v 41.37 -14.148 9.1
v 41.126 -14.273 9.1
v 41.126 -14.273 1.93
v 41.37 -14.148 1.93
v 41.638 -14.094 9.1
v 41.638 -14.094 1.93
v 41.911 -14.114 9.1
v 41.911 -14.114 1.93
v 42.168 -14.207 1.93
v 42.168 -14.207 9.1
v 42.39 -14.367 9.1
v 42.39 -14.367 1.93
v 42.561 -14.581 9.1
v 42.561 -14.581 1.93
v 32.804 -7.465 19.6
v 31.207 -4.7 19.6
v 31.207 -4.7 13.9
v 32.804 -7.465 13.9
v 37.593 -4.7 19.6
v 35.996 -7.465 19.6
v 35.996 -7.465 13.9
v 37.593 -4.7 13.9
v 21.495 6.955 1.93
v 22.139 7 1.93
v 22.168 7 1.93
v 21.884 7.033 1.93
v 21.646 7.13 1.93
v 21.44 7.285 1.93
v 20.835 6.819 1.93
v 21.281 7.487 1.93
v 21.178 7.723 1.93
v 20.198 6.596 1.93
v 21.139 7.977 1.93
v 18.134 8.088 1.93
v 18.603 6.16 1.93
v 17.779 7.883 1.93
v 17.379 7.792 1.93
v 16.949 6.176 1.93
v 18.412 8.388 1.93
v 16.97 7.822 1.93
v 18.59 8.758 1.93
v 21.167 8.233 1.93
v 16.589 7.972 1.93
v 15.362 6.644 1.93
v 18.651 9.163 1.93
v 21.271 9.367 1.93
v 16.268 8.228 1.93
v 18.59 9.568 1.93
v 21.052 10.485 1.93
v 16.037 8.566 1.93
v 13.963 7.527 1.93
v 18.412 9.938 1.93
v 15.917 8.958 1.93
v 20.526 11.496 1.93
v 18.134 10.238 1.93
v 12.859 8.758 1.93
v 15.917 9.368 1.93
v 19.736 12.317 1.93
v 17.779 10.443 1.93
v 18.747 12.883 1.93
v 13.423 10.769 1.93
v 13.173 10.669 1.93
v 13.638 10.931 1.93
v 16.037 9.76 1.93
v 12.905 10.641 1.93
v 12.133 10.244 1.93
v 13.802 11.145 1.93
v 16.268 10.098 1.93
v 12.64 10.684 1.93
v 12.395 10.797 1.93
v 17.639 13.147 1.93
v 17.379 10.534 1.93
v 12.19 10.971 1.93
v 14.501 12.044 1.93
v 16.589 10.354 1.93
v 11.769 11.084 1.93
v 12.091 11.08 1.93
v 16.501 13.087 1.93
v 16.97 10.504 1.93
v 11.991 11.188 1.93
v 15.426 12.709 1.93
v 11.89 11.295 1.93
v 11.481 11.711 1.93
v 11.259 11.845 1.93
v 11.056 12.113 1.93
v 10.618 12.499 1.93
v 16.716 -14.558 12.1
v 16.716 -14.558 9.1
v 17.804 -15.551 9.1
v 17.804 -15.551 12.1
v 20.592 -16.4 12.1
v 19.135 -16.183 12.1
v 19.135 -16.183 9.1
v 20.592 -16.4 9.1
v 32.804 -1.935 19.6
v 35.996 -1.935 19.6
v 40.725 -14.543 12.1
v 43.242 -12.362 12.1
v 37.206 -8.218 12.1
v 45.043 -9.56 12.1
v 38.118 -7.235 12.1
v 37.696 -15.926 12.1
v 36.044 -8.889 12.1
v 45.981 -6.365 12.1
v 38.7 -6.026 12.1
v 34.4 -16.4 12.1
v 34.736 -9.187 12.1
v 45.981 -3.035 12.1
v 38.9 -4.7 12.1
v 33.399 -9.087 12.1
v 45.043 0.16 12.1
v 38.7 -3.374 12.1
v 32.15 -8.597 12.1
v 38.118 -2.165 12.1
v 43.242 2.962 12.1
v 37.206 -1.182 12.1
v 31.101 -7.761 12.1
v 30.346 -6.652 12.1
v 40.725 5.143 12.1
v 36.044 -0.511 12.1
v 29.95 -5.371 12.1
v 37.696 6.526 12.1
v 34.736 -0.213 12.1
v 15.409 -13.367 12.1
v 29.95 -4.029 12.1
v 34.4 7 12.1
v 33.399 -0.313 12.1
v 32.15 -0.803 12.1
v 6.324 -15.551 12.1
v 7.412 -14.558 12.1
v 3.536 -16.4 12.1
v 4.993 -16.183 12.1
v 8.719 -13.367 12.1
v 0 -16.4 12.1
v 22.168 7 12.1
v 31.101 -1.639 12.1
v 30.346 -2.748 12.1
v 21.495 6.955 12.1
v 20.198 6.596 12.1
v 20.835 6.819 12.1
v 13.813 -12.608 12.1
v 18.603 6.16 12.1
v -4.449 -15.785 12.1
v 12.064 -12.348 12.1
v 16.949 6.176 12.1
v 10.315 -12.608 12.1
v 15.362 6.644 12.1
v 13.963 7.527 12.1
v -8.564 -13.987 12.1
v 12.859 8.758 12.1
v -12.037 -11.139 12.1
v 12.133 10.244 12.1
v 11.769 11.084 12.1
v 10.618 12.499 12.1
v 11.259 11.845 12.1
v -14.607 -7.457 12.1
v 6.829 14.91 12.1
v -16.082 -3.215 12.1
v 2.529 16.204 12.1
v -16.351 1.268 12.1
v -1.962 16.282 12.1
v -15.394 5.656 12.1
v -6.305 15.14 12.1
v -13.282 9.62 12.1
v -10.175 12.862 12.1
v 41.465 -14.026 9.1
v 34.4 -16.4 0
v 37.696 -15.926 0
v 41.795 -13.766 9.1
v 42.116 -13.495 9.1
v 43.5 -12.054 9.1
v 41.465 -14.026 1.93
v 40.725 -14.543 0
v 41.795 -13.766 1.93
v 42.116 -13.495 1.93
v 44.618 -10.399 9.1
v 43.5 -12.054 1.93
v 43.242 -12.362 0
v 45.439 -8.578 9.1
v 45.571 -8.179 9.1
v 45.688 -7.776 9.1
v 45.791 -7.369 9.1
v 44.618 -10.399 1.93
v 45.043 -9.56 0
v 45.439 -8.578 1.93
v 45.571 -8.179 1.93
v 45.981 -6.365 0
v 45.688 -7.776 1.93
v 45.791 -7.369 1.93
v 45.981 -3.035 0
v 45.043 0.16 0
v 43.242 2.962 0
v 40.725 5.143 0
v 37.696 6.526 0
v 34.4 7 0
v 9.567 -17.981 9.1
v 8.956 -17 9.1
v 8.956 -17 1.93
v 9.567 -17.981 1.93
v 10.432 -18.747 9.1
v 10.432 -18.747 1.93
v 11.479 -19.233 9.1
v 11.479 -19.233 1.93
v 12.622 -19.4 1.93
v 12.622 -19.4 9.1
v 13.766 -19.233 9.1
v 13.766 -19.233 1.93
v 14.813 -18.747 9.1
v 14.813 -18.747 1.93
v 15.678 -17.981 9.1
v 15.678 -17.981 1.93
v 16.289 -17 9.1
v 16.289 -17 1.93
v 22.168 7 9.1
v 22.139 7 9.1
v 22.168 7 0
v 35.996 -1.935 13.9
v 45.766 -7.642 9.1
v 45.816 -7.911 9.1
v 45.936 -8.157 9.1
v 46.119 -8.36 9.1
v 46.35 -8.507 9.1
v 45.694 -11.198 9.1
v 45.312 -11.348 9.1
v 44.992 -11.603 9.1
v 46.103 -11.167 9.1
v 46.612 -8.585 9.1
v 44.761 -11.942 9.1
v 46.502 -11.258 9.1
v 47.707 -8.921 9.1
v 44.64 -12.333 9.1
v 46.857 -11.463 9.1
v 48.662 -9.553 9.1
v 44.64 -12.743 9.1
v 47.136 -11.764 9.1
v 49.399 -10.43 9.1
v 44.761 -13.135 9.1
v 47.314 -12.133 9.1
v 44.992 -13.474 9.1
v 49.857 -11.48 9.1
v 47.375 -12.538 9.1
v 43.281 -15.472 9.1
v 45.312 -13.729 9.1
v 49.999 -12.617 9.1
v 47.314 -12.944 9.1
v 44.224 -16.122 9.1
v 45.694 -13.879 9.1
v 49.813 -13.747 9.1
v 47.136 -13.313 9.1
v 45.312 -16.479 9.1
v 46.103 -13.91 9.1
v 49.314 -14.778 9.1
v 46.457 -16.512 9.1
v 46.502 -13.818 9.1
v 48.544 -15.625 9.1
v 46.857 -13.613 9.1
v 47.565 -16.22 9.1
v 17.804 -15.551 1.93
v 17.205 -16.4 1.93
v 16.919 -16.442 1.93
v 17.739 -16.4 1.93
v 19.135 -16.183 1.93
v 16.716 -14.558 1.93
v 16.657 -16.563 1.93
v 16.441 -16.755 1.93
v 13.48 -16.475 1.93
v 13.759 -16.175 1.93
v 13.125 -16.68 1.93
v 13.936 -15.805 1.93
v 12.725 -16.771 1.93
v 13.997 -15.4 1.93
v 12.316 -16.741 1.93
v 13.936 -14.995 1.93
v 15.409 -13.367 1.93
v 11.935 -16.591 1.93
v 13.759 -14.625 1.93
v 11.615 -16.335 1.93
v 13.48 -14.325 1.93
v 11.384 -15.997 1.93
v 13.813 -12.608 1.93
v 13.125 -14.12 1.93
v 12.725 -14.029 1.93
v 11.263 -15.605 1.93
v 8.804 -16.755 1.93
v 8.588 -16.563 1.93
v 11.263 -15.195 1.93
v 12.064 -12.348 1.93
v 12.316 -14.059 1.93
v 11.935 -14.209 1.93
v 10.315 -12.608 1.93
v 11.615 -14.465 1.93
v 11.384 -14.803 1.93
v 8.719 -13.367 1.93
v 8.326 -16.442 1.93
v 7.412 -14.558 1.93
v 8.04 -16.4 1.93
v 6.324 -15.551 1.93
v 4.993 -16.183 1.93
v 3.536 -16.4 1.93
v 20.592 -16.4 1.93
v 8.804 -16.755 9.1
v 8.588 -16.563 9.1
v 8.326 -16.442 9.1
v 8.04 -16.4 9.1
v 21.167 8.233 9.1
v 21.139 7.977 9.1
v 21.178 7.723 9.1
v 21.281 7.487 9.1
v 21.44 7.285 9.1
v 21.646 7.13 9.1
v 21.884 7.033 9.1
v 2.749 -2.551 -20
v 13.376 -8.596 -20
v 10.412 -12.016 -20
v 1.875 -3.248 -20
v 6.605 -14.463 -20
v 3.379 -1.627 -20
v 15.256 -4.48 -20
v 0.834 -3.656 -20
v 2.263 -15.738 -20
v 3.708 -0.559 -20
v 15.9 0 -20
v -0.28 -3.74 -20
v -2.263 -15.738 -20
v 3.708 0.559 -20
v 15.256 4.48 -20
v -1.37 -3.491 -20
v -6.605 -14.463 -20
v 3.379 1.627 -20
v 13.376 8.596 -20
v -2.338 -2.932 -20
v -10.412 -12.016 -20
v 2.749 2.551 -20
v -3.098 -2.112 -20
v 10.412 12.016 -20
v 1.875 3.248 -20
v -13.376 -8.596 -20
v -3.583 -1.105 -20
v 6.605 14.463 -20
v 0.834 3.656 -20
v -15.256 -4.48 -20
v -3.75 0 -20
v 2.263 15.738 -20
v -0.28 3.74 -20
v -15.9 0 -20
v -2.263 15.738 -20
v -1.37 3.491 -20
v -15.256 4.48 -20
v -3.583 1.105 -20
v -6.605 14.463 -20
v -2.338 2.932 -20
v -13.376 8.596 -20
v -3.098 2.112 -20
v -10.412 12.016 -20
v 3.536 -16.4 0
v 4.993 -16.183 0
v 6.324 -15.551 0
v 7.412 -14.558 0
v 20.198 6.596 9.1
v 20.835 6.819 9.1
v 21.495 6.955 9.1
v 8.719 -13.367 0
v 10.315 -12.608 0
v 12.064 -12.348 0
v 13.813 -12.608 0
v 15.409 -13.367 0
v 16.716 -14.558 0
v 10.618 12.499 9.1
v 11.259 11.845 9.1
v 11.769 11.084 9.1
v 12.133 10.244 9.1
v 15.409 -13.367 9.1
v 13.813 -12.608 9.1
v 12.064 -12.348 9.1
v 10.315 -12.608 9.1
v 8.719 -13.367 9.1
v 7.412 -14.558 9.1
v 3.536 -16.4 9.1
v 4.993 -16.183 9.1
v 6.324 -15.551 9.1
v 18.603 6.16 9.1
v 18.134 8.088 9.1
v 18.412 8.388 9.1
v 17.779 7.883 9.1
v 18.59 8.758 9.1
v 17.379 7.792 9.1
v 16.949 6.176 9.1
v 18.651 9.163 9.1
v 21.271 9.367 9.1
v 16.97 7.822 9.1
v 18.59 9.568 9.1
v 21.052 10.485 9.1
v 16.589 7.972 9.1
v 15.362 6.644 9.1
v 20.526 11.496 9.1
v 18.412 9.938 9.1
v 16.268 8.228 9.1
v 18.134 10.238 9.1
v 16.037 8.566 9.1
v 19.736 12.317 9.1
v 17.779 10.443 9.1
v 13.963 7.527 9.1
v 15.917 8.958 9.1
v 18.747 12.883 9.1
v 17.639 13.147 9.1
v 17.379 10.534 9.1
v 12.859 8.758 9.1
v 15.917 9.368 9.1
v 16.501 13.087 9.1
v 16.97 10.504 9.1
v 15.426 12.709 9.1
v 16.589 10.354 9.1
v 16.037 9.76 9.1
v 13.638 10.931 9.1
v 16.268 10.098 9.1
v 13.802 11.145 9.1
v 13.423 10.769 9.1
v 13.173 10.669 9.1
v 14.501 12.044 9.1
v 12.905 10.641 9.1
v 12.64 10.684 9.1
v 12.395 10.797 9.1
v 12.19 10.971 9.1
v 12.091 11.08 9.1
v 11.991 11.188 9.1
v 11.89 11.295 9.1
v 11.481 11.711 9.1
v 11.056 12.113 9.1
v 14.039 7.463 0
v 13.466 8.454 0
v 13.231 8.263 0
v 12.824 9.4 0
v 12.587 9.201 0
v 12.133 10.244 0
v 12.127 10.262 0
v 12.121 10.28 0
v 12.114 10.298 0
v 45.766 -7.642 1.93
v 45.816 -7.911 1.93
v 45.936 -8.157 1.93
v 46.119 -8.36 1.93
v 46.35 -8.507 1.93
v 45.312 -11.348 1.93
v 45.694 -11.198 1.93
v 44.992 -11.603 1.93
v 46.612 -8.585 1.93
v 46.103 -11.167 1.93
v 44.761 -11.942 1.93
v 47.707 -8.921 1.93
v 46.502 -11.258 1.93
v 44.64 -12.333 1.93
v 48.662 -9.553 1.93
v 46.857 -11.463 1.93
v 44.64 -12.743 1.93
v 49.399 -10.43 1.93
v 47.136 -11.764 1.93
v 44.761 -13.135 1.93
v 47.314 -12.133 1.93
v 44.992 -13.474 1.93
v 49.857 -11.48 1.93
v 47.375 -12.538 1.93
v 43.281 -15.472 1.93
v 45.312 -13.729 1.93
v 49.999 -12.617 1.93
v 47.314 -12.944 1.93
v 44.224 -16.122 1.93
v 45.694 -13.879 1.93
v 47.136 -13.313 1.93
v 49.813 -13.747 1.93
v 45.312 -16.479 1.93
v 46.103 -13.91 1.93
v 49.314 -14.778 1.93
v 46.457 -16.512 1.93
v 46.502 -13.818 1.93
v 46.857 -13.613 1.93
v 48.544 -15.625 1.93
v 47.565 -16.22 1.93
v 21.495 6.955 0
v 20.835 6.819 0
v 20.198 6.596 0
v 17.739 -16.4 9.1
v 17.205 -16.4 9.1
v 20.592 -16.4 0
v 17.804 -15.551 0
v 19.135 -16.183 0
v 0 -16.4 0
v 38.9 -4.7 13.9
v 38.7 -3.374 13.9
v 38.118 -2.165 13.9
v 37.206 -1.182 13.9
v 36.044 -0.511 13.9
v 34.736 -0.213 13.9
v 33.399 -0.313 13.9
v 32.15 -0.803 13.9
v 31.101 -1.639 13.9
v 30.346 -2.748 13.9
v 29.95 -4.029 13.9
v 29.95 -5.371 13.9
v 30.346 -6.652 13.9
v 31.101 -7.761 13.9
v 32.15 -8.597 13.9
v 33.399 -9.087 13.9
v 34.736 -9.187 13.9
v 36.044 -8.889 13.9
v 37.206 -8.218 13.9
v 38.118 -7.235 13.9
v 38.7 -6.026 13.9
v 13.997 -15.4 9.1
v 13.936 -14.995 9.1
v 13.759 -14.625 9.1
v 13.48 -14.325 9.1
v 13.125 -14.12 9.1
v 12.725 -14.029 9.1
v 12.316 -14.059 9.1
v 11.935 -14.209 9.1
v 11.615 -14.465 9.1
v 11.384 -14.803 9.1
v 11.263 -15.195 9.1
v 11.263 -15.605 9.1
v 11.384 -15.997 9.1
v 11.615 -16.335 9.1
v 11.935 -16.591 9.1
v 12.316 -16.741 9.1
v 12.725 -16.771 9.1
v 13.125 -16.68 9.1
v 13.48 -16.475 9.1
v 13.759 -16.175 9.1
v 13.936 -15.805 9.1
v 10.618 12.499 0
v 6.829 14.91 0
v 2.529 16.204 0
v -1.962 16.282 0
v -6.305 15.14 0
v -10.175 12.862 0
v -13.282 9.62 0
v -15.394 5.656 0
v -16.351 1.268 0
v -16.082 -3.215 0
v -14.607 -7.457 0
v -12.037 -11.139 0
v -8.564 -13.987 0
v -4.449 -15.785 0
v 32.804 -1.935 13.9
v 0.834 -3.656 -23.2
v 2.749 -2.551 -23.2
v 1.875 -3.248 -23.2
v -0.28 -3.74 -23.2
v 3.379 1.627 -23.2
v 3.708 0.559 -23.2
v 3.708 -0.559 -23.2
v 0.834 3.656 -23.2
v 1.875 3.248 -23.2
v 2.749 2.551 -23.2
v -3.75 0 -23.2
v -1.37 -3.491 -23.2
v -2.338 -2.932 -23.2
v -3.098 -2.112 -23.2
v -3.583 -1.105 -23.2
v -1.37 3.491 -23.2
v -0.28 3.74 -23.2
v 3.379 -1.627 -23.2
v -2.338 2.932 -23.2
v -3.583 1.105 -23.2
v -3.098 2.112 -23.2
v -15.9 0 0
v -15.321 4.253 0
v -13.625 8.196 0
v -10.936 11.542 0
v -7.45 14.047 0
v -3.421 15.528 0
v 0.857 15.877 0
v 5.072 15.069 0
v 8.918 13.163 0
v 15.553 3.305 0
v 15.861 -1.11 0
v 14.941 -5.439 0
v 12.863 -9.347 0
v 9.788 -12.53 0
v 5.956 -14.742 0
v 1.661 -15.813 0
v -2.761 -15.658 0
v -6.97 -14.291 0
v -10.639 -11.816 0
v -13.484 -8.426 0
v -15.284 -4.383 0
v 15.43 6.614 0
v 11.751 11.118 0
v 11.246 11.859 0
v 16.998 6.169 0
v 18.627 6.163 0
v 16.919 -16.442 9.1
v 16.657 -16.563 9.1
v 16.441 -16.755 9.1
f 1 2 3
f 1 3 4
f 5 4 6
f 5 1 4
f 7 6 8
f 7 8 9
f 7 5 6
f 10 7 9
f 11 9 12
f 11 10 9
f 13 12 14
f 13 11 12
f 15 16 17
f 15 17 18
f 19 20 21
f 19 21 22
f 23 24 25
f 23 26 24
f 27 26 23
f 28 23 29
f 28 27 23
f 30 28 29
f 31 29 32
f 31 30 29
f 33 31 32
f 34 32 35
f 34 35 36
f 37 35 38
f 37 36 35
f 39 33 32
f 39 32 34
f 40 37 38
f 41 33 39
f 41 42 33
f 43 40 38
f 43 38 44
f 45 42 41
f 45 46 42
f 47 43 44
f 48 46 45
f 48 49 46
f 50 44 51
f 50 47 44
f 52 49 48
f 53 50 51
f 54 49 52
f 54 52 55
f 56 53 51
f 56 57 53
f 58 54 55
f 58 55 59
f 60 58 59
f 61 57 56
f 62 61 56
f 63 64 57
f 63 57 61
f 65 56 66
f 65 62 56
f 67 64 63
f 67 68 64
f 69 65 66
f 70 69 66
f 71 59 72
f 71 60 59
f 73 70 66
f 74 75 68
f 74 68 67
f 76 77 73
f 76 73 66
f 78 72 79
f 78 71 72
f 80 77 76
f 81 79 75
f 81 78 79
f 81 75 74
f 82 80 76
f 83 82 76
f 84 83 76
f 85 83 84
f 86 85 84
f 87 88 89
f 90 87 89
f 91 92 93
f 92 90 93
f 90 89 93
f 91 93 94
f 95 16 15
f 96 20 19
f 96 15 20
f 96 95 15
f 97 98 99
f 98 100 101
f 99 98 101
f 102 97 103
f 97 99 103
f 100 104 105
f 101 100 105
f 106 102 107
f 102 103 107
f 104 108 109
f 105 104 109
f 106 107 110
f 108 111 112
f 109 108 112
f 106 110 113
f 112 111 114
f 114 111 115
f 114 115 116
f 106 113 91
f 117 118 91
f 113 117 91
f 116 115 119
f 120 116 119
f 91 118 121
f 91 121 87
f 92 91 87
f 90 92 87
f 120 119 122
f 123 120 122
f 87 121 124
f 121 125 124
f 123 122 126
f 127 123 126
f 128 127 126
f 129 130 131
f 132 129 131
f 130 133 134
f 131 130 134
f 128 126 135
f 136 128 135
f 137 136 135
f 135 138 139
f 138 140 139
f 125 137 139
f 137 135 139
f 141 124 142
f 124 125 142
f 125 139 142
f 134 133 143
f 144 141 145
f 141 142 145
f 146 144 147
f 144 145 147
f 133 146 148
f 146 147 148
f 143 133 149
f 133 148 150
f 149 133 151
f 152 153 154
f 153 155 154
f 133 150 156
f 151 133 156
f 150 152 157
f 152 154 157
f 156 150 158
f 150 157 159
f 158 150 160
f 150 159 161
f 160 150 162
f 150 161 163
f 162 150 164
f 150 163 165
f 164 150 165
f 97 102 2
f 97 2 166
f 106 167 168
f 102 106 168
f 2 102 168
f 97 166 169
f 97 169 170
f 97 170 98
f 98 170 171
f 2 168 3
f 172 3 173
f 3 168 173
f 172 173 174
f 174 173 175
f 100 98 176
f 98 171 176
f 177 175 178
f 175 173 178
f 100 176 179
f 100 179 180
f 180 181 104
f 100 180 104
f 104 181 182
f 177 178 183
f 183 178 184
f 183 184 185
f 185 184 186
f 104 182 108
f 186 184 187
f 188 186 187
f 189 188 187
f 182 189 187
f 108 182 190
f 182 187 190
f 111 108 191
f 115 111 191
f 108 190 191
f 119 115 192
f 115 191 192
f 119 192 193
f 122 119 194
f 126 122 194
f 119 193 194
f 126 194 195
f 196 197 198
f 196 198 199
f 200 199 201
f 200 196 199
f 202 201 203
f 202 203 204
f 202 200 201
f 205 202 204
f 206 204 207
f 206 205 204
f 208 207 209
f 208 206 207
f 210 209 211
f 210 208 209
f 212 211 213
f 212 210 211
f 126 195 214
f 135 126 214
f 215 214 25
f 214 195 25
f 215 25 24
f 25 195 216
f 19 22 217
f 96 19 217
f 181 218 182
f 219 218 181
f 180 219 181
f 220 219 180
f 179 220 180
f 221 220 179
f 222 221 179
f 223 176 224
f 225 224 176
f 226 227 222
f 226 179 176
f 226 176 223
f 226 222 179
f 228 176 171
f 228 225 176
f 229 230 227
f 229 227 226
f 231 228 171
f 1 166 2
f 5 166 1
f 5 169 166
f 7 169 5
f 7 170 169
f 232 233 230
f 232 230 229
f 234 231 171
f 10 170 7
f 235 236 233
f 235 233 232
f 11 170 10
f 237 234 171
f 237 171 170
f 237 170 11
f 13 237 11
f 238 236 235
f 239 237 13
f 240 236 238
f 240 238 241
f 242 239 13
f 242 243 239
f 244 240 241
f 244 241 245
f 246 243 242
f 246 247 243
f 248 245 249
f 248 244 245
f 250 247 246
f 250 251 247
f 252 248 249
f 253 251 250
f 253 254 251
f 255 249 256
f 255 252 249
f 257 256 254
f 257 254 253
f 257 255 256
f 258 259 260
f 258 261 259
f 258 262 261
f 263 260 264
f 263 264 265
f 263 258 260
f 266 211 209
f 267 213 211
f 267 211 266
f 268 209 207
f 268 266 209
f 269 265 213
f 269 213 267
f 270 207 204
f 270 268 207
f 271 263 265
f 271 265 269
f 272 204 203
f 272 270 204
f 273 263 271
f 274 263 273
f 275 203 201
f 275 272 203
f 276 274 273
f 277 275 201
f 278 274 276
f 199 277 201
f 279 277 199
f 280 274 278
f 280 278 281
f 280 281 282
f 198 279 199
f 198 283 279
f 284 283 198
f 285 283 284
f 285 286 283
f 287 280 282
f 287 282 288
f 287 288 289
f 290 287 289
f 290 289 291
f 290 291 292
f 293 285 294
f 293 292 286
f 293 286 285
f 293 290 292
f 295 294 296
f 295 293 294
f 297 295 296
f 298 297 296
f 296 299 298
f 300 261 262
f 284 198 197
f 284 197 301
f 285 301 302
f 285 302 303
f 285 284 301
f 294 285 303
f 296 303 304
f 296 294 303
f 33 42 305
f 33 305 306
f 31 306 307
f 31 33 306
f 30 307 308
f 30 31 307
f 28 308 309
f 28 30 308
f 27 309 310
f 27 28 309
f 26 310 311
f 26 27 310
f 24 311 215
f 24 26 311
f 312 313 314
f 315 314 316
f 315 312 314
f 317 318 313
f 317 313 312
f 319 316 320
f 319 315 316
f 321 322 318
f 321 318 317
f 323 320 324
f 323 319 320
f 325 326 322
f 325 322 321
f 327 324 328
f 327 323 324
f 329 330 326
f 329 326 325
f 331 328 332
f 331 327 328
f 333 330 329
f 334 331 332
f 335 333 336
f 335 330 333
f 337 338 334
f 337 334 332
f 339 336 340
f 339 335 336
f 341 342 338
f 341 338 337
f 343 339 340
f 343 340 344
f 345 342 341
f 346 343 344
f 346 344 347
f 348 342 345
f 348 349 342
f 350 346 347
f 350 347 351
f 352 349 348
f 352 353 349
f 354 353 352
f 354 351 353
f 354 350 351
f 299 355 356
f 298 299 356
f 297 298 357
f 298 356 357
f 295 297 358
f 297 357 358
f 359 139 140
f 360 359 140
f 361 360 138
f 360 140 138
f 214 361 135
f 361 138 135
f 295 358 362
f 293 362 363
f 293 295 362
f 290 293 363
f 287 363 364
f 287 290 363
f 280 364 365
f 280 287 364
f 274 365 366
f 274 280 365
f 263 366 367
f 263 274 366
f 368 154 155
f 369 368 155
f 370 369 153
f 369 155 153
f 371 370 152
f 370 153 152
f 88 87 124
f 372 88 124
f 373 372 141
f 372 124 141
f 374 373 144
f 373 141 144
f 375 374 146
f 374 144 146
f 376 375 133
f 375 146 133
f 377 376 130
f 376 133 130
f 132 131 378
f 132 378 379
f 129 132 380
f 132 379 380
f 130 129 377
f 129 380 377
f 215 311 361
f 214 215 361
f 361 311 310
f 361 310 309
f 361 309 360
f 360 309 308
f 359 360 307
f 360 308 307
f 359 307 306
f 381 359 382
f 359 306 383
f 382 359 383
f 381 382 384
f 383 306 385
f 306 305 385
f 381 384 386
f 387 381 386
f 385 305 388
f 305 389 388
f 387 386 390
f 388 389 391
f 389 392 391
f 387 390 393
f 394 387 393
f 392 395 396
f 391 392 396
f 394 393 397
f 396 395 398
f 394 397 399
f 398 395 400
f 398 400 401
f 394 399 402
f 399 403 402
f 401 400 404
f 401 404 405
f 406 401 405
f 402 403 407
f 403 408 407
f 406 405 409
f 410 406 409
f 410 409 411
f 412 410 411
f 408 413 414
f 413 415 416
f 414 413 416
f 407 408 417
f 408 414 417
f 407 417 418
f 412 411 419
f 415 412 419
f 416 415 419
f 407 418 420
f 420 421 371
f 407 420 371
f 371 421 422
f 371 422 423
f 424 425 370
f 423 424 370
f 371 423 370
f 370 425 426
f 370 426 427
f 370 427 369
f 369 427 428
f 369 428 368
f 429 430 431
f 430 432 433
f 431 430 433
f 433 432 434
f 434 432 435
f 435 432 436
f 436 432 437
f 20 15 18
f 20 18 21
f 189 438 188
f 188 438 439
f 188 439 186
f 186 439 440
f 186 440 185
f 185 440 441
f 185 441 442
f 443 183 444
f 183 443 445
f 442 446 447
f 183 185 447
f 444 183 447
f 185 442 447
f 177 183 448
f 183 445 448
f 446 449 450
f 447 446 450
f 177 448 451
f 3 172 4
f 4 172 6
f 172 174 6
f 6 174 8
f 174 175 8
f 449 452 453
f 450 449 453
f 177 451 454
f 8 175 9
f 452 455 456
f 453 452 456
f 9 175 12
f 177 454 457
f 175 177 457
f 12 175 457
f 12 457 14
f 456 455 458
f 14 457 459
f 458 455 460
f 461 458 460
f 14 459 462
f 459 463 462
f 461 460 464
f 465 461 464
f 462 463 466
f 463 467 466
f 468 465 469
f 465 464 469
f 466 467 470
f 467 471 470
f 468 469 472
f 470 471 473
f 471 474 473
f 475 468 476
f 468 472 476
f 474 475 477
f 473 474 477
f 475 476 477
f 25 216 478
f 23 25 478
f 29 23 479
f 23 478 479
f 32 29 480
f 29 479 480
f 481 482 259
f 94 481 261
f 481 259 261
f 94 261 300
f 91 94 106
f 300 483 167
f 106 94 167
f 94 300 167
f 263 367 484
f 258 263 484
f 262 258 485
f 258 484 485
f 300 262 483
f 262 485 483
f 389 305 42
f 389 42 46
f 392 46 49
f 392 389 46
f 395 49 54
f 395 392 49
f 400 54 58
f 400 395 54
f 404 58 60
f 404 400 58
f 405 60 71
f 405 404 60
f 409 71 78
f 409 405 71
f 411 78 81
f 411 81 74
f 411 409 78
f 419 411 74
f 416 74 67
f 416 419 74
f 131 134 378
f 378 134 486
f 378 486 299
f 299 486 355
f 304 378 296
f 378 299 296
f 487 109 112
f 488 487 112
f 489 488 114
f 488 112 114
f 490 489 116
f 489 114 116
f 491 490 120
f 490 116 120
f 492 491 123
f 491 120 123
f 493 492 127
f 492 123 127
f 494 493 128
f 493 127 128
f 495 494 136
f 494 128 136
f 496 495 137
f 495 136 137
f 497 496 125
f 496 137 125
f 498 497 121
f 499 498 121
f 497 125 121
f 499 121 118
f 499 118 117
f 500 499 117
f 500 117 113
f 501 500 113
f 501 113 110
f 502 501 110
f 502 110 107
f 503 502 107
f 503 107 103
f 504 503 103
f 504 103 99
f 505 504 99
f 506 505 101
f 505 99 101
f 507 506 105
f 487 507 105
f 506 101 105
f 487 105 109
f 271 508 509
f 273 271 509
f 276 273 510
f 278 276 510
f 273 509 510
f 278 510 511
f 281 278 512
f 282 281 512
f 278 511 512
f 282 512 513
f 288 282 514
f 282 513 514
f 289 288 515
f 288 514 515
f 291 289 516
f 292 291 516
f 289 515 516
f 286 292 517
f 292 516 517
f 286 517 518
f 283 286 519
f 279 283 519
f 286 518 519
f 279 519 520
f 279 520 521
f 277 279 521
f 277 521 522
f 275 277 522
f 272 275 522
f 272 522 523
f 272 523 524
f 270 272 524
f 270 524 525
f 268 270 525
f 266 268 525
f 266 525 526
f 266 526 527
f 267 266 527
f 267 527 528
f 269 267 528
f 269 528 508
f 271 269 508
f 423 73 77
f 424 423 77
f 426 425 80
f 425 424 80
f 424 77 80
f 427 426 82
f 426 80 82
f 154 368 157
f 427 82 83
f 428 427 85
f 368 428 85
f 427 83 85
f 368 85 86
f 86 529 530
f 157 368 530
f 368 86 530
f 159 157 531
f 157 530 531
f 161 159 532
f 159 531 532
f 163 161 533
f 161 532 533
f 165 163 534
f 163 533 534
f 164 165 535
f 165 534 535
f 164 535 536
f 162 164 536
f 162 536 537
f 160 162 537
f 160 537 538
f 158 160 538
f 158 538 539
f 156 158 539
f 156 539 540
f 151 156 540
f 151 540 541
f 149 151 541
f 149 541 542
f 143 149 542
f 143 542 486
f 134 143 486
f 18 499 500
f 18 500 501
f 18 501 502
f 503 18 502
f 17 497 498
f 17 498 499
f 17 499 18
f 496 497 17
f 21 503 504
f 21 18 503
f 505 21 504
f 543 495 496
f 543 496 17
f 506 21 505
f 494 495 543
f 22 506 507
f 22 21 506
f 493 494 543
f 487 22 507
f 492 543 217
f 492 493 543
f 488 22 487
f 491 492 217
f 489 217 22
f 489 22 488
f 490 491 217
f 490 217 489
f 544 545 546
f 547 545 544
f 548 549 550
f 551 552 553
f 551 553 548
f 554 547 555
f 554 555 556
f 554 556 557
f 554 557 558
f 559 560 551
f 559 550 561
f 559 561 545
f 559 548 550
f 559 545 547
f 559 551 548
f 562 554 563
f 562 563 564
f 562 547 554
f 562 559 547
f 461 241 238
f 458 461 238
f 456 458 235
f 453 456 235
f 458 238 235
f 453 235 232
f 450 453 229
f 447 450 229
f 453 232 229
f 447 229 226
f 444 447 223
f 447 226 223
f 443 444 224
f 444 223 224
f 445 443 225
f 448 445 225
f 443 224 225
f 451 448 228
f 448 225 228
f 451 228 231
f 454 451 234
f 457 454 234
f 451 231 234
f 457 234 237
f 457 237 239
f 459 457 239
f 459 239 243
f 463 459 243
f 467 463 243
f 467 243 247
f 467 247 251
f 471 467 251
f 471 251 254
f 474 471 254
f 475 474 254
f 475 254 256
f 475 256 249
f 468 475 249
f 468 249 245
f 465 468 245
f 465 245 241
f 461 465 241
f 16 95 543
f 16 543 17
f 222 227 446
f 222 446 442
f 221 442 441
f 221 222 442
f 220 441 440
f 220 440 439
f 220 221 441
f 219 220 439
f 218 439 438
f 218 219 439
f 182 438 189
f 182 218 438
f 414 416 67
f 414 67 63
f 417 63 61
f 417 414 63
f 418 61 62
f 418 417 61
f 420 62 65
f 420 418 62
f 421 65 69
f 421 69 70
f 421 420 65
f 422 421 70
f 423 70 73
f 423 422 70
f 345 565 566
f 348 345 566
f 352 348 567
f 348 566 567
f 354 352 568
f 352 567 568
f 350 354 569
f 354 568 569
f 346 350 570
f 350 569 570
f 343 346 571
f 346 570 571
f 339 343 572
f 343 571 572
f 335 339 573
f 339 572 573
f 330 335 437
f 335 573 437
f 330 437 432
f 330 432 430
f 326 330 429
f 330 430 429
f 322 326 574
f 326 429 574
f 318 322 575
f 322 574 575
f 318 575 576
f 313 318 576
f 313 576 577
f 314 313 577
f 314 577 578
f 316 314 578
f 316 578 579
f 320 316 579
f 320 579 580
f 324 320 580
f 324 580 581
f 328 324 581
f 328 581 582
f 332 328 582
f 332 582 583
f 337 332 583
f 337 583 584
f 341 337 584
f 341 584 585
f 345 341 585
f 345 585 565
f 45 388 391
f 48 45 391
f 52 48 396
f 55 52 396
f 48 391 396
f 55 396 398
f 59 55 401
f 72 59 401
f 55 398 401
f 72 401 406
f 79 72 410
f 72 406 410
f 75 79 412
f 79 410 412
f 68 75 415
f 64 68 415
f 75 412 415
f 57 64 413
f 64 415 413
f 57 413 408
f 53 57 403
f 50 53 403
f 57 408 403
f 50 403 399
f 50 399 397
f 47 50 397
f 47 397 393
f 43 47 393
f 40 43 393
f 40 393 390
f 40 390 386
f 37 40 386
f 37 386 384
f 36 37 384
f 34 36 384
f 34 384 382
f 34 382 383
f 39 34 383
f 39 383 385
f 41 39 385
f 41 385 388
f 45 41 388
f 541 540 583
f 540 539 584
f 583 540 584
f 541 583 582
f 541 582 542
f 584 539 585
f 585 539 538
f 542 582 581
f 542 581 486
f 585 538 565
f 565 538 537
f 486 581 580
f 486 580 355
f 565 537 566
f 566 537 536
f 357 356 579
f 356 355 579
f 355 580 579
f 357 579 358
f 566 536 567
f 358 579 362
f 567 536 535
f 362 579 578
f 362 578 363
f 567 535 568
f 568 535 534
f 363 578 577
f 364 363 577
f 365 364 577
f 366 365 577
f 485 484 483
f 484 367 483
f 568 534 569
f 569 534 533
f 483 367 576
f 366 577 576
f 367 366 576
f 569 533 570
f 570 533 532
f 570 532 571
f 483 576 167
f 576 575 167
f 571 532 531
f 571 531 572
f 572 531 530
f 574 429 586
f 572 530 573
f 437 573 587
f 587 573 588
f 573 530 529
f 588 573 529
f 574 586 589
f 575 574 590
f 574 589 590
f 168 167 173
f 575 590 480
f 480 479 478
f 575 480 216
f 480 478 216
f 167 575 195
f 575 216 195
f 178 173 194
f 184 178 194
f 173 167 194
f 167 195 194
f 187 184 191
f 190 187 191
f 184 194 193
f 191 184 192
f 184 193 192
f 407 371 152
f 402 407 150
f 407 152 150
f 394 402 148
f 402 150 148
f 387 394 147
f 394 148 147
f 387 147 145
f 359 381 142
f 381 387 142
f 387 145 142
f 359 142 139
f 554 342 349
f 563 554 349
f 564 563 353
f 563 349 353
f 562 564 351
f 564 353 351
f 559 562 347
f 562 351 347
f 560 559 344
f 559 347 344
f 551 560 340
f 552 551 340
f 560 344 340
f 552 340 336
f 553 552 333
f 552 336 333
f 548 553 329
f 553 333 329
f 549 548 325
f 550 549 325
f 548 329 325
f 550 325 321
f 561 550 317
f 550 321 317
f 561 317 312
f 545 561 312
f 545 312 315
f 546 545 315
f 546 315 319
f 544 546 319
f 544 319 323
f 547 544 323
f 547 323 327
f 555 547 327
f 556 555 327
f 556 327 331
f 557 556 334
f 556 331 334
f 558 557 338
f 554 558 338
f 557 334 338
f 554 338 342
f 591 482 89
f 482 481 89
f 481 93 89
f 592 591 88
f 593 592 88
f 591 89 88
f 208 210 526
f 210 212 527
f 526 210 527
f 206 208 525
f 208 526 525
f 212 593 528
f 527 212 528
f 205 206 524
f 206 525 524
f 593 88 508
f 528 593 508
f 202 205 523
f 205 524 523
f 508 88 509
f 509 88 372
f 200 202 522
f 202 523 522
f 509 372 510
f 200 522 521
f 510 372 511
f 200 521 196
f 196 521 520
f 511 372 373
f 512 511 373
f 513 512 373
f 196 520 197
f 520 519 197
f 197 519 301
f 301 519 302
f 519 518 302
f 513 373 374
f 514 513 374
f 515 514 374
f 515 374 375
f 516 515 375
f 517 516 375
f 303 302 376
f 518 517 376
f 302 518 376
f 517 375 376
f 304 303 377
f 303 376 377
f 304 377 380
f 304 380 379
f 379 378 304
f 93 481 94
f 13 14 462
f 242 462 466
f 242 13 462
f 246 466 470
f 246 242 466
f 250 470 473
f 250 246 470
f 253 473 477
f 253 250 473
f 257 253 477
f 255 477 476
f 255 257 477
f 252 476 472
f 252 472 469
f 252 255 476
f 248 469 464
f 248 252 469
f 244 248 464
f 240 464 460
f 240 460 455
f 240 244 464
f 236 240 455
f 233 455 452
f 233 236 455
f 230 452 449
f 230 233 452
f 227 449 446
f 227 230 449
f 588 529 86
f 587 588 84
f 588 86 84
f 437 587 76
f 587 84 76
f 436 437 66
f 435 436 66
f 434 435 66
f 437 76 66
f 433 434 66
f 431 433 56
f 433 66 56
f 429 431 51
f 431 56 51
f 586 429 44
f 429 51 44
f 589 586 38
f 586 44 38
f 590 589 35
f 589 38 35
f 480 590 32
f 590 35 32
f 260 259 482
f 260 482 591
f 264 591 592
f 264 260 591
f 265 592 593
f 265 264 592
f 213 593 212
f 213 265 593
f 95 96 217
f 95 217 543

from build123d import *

# Parameters (mm, degrees)
BOSS_EXTRUDE1_DEPTH = 12.1
SKETCH2_R           = 4
BOSS_EXTRUDE2_DEPTH = 7.17
SKETCH3_R           = 15.9
BOSS_EXTRUDE3_DEPTH = 20
SKETCH4_R           = 3.75
BOSS_EXTRUDE4_DEPTH = 3.2
SKETCH5_R           = 4.5
BOSS_EXTRUDE5_DEPTH = 1.8
BOSS_EXTRUDE6_DEPTH = 5.7
SKETCH8_R           = 6
CUT_EXTRUDE2_DEPTH  = 3
SKETCH7_R           = 1.375
CUT_EXTRUDE1_DEPTH  = 63.607108223
CUT_EXTRUDE3_START  = -1.93
SKETCH9_R           = 6
CUT_EXTRUDE3_DEPTH  = 1.93
FILLET1_R           = 1
FILLET2_R           = 5


with BuildPart() as part:
    # Sketch1 → Boss-Extrude1 (new body)
    with BuildSketch(Plane.XY):
        with BuildLine():
            Line((0, -16.4), (34.4, -16.4))
            ThreePointArc((34.4, -16.4), (46.1, -4.7), (34.4, 7))
            Line((34.4, 7), (14.831048513, 7))
            ThreePointArc((14.831048513, 7), (-13.852075657, 8.779521627), (0, -16.4))
        make_face()
    extrude(amount=BOSS_EXTRUDE1_DEPTH)

    # Sketch2 → Boss-Extrude2 (add)
    with BuildSketch(Plane.XY.offset(9.1)):
        with Locations((17.276313416, 9.163011328)):
            Circle(SKETCH2_R)
        with Locations((46, -12.538367177)):
            Circle(SKETCH2_R)
        with Locations((12.6224468, -15.4)):
            Circle(SKETCH2_R)
    extrude(amount=-BOSS_EXTRUDE2_DEPTH)

    # Sketch3 → Boss-Extrude3 (add)
    with BuildSketch(Plane(origin=(0, 0, 0), x_dir=(-1, 0, 0), z_dir=(0, 0, -1))):
        Circle(SKETCH3_R)
    extrude(amount=BOSS_EXTRUDE3_DEPTH)

    # Sketch4 → Boss-Extrude4 (add)
    with BuildSketch(Plane(origin=(0, 0, -20), x_dir=(-1, 0, 0), z_dir=(0, 0, -1))):
        Circle(SKETCH4_R)
    extrude(amount=BOSS_EXTRUDE4_DEPTH)

    # Sketch5 → Boss-Extrude5 (add)
    with BuildSketch(Plane.XY.offset(12.1)):
        with Locations((34.4, -4.7)):
            Circle(SKETCH5_R)
    extrude(amount=BOSS_EXTRUDE5_DEPTH)

    # Sketch6 → Boss-Extrude6 (add)
    with BuildSketch(Plane.XY.offset(13.9)):
        Polygon((35.996373494, -7.465), (37.592746989, -4.7), (35.996373494, -1.935), (32.803626506, -1.935), (31.207253011, -4.7), (32.803626506, -7.465), align=None)
    extrude(amount=BOSS_EXTRUDE6_DEPTH)

    # Sketch8 → Cut-Extrude2 (cut)
    with BuildSketch(Plane.XY.offset(12.1)):
        with Locations((17.83477741, 12.110572688)):
            Circle(SKETCH8_R)
        with Locations((12.063982807, -18.347561359)):
            Circle(SKETCH8_R)
    extrude(amount=-CUT_EXTRUDE2_DEPTH, mode=Mode.SUBTRACT)

    # Sketch7 → Cut-Extrude1 (cut, through all)
    with BuildSketch(Plane.XY.offset(9.1)):
        with Locations((17.276313416, 9.163011328)):
            Circle(SKETCH7_R)
        with Locations((46, -12.538367177)):
            Circle(SKETCH7_R)
        with Locations((12.6224468, -15.4)):
            Circle(SKETCH7_R)
    extrude(amount=-CUT_EXTRUDE1_DEPTH, mode=Mode.SUBTRACT)

    # Sketch9 → Cut-Extrude3 (cut)
    with BuildSketch(Plane(origin=(0, 0, 0), x_dir=(-1, 0, 0), z_dir=(0, 0, -1)).offset(CUT_EXTRUDE3_START)):
        with Locations((-12.063982807, -18.347561359)):
            Circle(SKETCH9_R)
        with Locations((-17.83477741, 12.110572688)):
            Circle(SKETCH9_R)
    extrude(amount=CUT_EXTRUDE3_DEPTH, mode=Mode.SUBTRACT)

    # Fillet1
    # the kernel refuses this fillet: 1 mm, written as the material it adds along each edge
    with BuildSketch(Plane(origin=(8.749463454, -16.4, 1.93), x_dir=(-1, 0, 0), z_dir=(0, 0, 1))) as fillet1_piece_1:
        with BuildLine():
            CenterArc((0.709592349, 1), FILLET1_R, 203.578178478, 66.421821522)
            ThreePointArc((-0.20692279, 0.6), (-0.091542385, 0.304110525), (0, 0))
            Line((0, 0), (0.709592349, 0))
        make_face()
    extrude(amount=7.17)
    with BuildSketch(Plane(origin=(16.495430147, -16.4, 1.93), x_dir=(1, 0, 0), z_dir=(0, 0, 1))) as fillet1_piece_2:
        with BuildLine():
            CenterArc((0.709592349, -1), FILLET1_R, 90, 66.421821522)
            ThreePointArc((-0.20692279, -0.6), (-0.091542385, -0.304110525), (0, 0))
            Line((0, 0), (0.709592349, 0))
        make_face()
    extrude(amount=7.17)
    with BuildSketch(Plane(origin=(42.116078953, -13.495005719, 9.1), x_dir=(-0.786111356647784, -0.6180848929955987, 0), z_dir=(0, 0, -1))) as fillet1_piece_3:
        with BuildLine():
            CenterArc((1.313089389, -0.998550915), FILLET1_R, 93.084870556, 94.384925022)
            ThreePointArc((0.321575856, -1.128554433), (0.202398335, -0.552420542), (0, 0))
            ThreePointArc((0, 0), (0.629637125, -0.016954289), (1.25927425, 0))
        make_face()
    extrude(amount=7.17)
    with BuildSketch(Plane(origin=(45.438635333, -8.577954356, 9.1), x_dir=(0.2801956563205793, 0.959942911937517, 0), z_dir=(0, 0, -1))) as fillet1_piece_4:
        with BuildLine():
            CenterArc((1.313089389, 0.998550915), FILLET1_R, 172.530204422, 94.384925022)
            ThreePointArc((0.321575856, 1.128554433), (0.202398335, 0.552420542), (0, 0))
            ThreePointArc((0, 0), (0.629637125, 0.016954289), (1.25927425, 0))
        make_face()
    extrude(amount=7.17)
    with BuildSketch(Plane(origin=(13.299776183, 9.595621579, 9.1), x_dir=(-0.6279509963726487, 0.7782528805951172, 0), z_dir=(0, 0, -1))) as fillet1_piece_5:
        with BuildLine():
            CenterArc((1.821464626, 0.998546906), FILLET1_R, 158.597997632, 108.312865848)
            ThreePointArc((0.890421562, 1.363456228), (0.515330012, 0.635935903), (0, 0))
            ThreePointArc((0, 0), (0.88378757, 0.023830743), (1.76757514, 0))
        make_face()
    extrude(amount=7.17)
    with BuildSketch(Plane(origin=(20.641039556, 7, -1.81533395), x_dir=(1, 0, 0), z_dir=(0, 0, 1))) as fillet1_piece_6_section:
        with BuildLine():
            CenterArc((1.49813358, 1), FILLET1_R, 166.549673426, 103.450326574)
            ThreePointArc((0.525561636, 1.232602266), (0.314762115, 0.59413715), (0, 0))
            Line((0, 0), (1.49813358, 0))
        make_face()
    fillet1_piece_6 = extrude(amount=10.91533395, mode=Mode.PRIVATE)
    fillet1_piece_6 = fillet1_piece_6 - Plane(origin=(17.83477741, 12.110572688, 0.965), x_dir=(-1, 0, 0), z_dir=(0, 0, 1)) * Cylinder(6, 28, mode=Mode.PRIVATE)
    fillet1_piece_6 = split(fillet1_piece_6, bisect_by=Plane(origin=(21.45614867, 7.07760615, 0), z_dir=(0, 0, 1)), keep=Keep.TOP, mode=Mode.PRIVATE)
    fillet1_piece_6 = split(fillet1_piece_6, bisect_by=Plane(origin=(21.45614867, 7.07760615, 1.93), z_dir=(0, 0, -1)), keep=Keep.TOP, mode=Mode.PRIVATE)
    add(fillet1_piece_6)
    with BuildSketch(Plane(origin=(20.641039556, 7, 1.93), x_dir=(1, 0, 0), z_dir=(0, 0, 1))) as fillet1_piece_7_section:
        with BuildLine():
            CenterArc((1.49813358, 1), FILLET1_R, 166.549673426, 103.450326574)
            ThreePointArc((0.525561636, 1.232602266), (0.314762115, 0.59413715), (0, 0))
            Line((0, 0), (1.49813358, 0))
        make_face()
    fillet1_piece_7 = extrude(amount=7.17, mode=Mode.PRIVATE)
    fillet1_piece_7 = fillet1_piece_7 - Plane(origin=(17.83477741, 12.110572688, 5.515), x_dir=(-1, 0, 0), z_dir=(0, 0, 1)) * Cylinder(6, 21, mode=Mode.PRIVATE)
    add(fillet1_piece_7)
    with BuildSketch(Plane(origin=(20.641039556, 7, 1.93), x_dir=(1, 0, 0), z_dir=(0, 0, 1))) as fillet1_piece_8_section:
        with BuildLine():
            CenterArc((1.49813358, 1), FILLET1_R, 166.549673426, 103.450326574)
            ThreePointArc((0.525561636, 1.232602266), (0.314762115, 0.59413715), (0, 0))
            Line((0, 0), (1.49813358, 0))
        make_face()
    fillet1_piece_8 = extrude(amount=7.17, mode=Mode.PRIVATE)
    fillet1_piece_8 = fillet1_piece_8 & Plane(origin=(17.83477741, 12.110572688, 5.515), x_dir=(-1, 0, 0), z_dir=(0, 0, 1)) * Cylinder(6, 21, mode=Mode.PRIVATE)
    add(fillet1_piece_8)
    with BuildSketch(Plane(origin=(20.641039556, 7, 1.93), x_dir=(1, 0, 0), z_dir=(0, 0, 1))) as fillet1_piece_9_section:
        with BuildLine():
            CenterArc((1.49813358, 1), FILLET1_R, 166.549673426, 103.450326574)
            ThreePointArc((0.525561636, 1.232602266), (0.314762115, 0.59413715), (0, 0))
            Line((0, 0), (1.49813358, 0))
        make_face()
    fillet1_piece_9 = extrude(amount=10.91533395, mode=Mode.PRIVATE)
    fillet1_piece_9 = fillet1_piece_9 - Plane(origin=(17.83477741, 12.110572688, 10.6), x_dir=(-1, 0, 0), z_dir=(0, 0, 1)) * Cylinder(6, 28, mode=Mode.PRIVATE)
    fillet1_piece_9 = split(fillet1_piece_9, bisect_by=Plane(origin=(21.45614867, 7.07760615, 9.1), z_dir=(0, 0, 1)), keep=Keep.TOP, mode=Mode.PRIVATE)
    fillet1_piece_9 = split(fillet1_piece_9, bisect_by=Plane(origin=(21.45614867, 7.07760615, 12.1), z_dir=(0, 0, -1)), keep=Keep.TOP, mode=Mode.PRIVATE)
    add(fillet1_piece_9)

    # Fillet2
    # the kernel refuses this fillet: 5 mm, written as the material it takes off along each edge
    with BuildSketch(Plane(origin=(17.739104369, -16.4, -7.132871381), x_dir=(-0.4856410354617555, 0.8741583292948903, 0), z_dir=(0, 0, 1))) as fillet2_piece_1:
        with BuildLine():
            CenterArc((2.985185629, -4.922308749), FILLET2_R, 100.113527083, 50.831993071)
            Line((-1.385606017, -2.494103572), (0, 0))
            ThreePointArc((0, 0), (1.053594928, -0.093229501), (2.107189856, 0))
        make_face()
    extrude(amount=9.062871381, mode=Mode.SUBTRACT)
    with BuildSketch(Plane(origin=(6.388861244, -16.4, -7.132871381), x_dir=(-1, 0, 0), z_dir=(0, 0, 1))) as fillet2_piece_2:
        with BuildLine():
            CenterArc((2.853148552, -5), FILLET2_R, 90, 50.831993071)
            ThreePointArc((-1.023337864, -1.842017564), (-0.430171587, -0.966284853), (0, 0))
            Line((0, 0), (2.853148552, 0))
        make_face()
    extrude(amount=9.062871381, mode=Mode.SUBTRACT)
    with BuildSketch(Plane(origin=(17.739104369, -16.4, 9.1), x_dir=(-0.4856410354617568, 0.8741583292948896, 0), z_dir=(0, 0, 1))) as fillet2_piece_3:
        with BuildLine():
            CenterArc((2.985185629, -4.922308749), FILLET2_R, 100.113527083, 50.831993071)
            Line((-1.385606017, -2.494103572), (0, 0))
            ThreePointArc((0, 0), (1.053594928, -0.093229501), (2.107189856, 0))
        make_face()
    extrude(amount=10.132871381, mode=Mode.SUBTRACT)
    with BuildSketch(Plane(origin=(6.388861244, -16.4, 9.1), x_dir=(-1, 0, 0), z_dir=(0, 0, 1))) as fillet2_piece_4:
        with BuildLine():
            CenterArc((2.853148552, -5), FILLET2_R, 90, 50.831993071)
            ThreePointArc((-1.023337864, -1.842017564), (-0.430171587, -0.966284853), (0, 0))
            Line((0, 0), (2.853148552, 0))
        make_face()
    extrude(amount=10.132871381, mode=Mode.SUBTRACT)
    with BuildSketch(Plane(origin=(11.890467167, 11.294989621, 1.93), x_dir=(-0.7264583233980587, 0.6872105240504408, 0), z_dir=(0, 0, -1))) as fillet2_piece_5:
        with BuildLine():
            CenterArc((1.484745631, -4.99286384), FILLET2_R, 86.938483712, 31.524868326)
            ThreePointArc((-0.898237104, -0.597253156), (-0.435669612, -0.318853072), (0, 0))
            ThreePointArc((0, 0), (0.875893106, 0.023406604), (1.751786212, 0))
        make_face()
    extrude(amount=1.93, mode=Mode.SUBTRACT)
    with BuildSketch(Plane(origin=(21.423177854, 7.301894881, -3.534616353), x_dir=(0.9267551866460263, -0.37566584090743305, 0), z_dir=(0, 0, 1))) as fillet2_piece_6:
        with BuildLine():
            CenterArc((2.681955321, -4.633775933), FILLET2_R, 112.065471844, 23.198889906)
            Line((-0.869853786, -1.114592496), (-1.225034697, -0.762674153))
            ThreePointArc((-1.225034697, -0.762674153), (-0.796151939, -0.275387861), (-0.427668726, 0.259035636))
            Line((-0.427668726, 0.259035636), (0.200649047, 0.457973755))
            ThreePointArc((0.200649047, 0.457973755), (0.589131014, 0.452569916), (0.615793196, 0.463377593))
            Line((0.615793196, 0.463377593), (0.803626117, 0))
        make_face()
    extrude(amount=5.464616353, mode=Mode.SUBTRACT)
    with BuildSketch(Plane(origin=(21.423177854, 7.301894881, 15.634616353), x_dir=(0.9267551866460257, -0.3756658409074346, 0), z_dir=(0, 0, -1))) as fillet2_piece_7:
        with BuildLine():
            CenterArc((2.681955321, 4.633775933), FILLET2_R, 224.73563825, 23.198889906)
            Line((-0.869853786, 1.114592496), (-1.225034697, 0.762674153))
            ThreePointArc((-1.225034697, 0.762674153), (-0.796151939, 0.275387861), (-0.427668726, -0.259035636))
            Line((-0.427668726, -0.259035636), (0.200649047, -0.457973755))
            ThreePointArc((0.200649047, -0.457973755), (0.589131014, -0.452569916), (0.615793196, -0.463377593))
            Line((0.615793196, -0.463377593), (0.803626117, 0))
        make_face()
    extrude(amount=6.534616353, mode=Mode.SUBTRACT)
    with BuildSketch(Plane(origin=(11.890467167, 11.294989621, 16.479465531), x_dir=(-0.7264583233980683, 0.6872105240504307, 0), z_dir=(0, 0, -1))) as fillet2_piece_8:
        with BuildLine():
            CenterArc((1.484745631, -4.99286384), FILLET2_R, 86.938483712, 31.524868326)
            ThreePointArc((-0.898237104, -0.597253156), (-0.435669612, -0.318853072), (0, 0))
            ThreePointArc((0, 0), (0.875893106, 0.023406604), (1.751786212, 0))
        make_face()
    extrude(amount=7.379465531, mode=Mode.SUBTRACT)


solid = part.part
